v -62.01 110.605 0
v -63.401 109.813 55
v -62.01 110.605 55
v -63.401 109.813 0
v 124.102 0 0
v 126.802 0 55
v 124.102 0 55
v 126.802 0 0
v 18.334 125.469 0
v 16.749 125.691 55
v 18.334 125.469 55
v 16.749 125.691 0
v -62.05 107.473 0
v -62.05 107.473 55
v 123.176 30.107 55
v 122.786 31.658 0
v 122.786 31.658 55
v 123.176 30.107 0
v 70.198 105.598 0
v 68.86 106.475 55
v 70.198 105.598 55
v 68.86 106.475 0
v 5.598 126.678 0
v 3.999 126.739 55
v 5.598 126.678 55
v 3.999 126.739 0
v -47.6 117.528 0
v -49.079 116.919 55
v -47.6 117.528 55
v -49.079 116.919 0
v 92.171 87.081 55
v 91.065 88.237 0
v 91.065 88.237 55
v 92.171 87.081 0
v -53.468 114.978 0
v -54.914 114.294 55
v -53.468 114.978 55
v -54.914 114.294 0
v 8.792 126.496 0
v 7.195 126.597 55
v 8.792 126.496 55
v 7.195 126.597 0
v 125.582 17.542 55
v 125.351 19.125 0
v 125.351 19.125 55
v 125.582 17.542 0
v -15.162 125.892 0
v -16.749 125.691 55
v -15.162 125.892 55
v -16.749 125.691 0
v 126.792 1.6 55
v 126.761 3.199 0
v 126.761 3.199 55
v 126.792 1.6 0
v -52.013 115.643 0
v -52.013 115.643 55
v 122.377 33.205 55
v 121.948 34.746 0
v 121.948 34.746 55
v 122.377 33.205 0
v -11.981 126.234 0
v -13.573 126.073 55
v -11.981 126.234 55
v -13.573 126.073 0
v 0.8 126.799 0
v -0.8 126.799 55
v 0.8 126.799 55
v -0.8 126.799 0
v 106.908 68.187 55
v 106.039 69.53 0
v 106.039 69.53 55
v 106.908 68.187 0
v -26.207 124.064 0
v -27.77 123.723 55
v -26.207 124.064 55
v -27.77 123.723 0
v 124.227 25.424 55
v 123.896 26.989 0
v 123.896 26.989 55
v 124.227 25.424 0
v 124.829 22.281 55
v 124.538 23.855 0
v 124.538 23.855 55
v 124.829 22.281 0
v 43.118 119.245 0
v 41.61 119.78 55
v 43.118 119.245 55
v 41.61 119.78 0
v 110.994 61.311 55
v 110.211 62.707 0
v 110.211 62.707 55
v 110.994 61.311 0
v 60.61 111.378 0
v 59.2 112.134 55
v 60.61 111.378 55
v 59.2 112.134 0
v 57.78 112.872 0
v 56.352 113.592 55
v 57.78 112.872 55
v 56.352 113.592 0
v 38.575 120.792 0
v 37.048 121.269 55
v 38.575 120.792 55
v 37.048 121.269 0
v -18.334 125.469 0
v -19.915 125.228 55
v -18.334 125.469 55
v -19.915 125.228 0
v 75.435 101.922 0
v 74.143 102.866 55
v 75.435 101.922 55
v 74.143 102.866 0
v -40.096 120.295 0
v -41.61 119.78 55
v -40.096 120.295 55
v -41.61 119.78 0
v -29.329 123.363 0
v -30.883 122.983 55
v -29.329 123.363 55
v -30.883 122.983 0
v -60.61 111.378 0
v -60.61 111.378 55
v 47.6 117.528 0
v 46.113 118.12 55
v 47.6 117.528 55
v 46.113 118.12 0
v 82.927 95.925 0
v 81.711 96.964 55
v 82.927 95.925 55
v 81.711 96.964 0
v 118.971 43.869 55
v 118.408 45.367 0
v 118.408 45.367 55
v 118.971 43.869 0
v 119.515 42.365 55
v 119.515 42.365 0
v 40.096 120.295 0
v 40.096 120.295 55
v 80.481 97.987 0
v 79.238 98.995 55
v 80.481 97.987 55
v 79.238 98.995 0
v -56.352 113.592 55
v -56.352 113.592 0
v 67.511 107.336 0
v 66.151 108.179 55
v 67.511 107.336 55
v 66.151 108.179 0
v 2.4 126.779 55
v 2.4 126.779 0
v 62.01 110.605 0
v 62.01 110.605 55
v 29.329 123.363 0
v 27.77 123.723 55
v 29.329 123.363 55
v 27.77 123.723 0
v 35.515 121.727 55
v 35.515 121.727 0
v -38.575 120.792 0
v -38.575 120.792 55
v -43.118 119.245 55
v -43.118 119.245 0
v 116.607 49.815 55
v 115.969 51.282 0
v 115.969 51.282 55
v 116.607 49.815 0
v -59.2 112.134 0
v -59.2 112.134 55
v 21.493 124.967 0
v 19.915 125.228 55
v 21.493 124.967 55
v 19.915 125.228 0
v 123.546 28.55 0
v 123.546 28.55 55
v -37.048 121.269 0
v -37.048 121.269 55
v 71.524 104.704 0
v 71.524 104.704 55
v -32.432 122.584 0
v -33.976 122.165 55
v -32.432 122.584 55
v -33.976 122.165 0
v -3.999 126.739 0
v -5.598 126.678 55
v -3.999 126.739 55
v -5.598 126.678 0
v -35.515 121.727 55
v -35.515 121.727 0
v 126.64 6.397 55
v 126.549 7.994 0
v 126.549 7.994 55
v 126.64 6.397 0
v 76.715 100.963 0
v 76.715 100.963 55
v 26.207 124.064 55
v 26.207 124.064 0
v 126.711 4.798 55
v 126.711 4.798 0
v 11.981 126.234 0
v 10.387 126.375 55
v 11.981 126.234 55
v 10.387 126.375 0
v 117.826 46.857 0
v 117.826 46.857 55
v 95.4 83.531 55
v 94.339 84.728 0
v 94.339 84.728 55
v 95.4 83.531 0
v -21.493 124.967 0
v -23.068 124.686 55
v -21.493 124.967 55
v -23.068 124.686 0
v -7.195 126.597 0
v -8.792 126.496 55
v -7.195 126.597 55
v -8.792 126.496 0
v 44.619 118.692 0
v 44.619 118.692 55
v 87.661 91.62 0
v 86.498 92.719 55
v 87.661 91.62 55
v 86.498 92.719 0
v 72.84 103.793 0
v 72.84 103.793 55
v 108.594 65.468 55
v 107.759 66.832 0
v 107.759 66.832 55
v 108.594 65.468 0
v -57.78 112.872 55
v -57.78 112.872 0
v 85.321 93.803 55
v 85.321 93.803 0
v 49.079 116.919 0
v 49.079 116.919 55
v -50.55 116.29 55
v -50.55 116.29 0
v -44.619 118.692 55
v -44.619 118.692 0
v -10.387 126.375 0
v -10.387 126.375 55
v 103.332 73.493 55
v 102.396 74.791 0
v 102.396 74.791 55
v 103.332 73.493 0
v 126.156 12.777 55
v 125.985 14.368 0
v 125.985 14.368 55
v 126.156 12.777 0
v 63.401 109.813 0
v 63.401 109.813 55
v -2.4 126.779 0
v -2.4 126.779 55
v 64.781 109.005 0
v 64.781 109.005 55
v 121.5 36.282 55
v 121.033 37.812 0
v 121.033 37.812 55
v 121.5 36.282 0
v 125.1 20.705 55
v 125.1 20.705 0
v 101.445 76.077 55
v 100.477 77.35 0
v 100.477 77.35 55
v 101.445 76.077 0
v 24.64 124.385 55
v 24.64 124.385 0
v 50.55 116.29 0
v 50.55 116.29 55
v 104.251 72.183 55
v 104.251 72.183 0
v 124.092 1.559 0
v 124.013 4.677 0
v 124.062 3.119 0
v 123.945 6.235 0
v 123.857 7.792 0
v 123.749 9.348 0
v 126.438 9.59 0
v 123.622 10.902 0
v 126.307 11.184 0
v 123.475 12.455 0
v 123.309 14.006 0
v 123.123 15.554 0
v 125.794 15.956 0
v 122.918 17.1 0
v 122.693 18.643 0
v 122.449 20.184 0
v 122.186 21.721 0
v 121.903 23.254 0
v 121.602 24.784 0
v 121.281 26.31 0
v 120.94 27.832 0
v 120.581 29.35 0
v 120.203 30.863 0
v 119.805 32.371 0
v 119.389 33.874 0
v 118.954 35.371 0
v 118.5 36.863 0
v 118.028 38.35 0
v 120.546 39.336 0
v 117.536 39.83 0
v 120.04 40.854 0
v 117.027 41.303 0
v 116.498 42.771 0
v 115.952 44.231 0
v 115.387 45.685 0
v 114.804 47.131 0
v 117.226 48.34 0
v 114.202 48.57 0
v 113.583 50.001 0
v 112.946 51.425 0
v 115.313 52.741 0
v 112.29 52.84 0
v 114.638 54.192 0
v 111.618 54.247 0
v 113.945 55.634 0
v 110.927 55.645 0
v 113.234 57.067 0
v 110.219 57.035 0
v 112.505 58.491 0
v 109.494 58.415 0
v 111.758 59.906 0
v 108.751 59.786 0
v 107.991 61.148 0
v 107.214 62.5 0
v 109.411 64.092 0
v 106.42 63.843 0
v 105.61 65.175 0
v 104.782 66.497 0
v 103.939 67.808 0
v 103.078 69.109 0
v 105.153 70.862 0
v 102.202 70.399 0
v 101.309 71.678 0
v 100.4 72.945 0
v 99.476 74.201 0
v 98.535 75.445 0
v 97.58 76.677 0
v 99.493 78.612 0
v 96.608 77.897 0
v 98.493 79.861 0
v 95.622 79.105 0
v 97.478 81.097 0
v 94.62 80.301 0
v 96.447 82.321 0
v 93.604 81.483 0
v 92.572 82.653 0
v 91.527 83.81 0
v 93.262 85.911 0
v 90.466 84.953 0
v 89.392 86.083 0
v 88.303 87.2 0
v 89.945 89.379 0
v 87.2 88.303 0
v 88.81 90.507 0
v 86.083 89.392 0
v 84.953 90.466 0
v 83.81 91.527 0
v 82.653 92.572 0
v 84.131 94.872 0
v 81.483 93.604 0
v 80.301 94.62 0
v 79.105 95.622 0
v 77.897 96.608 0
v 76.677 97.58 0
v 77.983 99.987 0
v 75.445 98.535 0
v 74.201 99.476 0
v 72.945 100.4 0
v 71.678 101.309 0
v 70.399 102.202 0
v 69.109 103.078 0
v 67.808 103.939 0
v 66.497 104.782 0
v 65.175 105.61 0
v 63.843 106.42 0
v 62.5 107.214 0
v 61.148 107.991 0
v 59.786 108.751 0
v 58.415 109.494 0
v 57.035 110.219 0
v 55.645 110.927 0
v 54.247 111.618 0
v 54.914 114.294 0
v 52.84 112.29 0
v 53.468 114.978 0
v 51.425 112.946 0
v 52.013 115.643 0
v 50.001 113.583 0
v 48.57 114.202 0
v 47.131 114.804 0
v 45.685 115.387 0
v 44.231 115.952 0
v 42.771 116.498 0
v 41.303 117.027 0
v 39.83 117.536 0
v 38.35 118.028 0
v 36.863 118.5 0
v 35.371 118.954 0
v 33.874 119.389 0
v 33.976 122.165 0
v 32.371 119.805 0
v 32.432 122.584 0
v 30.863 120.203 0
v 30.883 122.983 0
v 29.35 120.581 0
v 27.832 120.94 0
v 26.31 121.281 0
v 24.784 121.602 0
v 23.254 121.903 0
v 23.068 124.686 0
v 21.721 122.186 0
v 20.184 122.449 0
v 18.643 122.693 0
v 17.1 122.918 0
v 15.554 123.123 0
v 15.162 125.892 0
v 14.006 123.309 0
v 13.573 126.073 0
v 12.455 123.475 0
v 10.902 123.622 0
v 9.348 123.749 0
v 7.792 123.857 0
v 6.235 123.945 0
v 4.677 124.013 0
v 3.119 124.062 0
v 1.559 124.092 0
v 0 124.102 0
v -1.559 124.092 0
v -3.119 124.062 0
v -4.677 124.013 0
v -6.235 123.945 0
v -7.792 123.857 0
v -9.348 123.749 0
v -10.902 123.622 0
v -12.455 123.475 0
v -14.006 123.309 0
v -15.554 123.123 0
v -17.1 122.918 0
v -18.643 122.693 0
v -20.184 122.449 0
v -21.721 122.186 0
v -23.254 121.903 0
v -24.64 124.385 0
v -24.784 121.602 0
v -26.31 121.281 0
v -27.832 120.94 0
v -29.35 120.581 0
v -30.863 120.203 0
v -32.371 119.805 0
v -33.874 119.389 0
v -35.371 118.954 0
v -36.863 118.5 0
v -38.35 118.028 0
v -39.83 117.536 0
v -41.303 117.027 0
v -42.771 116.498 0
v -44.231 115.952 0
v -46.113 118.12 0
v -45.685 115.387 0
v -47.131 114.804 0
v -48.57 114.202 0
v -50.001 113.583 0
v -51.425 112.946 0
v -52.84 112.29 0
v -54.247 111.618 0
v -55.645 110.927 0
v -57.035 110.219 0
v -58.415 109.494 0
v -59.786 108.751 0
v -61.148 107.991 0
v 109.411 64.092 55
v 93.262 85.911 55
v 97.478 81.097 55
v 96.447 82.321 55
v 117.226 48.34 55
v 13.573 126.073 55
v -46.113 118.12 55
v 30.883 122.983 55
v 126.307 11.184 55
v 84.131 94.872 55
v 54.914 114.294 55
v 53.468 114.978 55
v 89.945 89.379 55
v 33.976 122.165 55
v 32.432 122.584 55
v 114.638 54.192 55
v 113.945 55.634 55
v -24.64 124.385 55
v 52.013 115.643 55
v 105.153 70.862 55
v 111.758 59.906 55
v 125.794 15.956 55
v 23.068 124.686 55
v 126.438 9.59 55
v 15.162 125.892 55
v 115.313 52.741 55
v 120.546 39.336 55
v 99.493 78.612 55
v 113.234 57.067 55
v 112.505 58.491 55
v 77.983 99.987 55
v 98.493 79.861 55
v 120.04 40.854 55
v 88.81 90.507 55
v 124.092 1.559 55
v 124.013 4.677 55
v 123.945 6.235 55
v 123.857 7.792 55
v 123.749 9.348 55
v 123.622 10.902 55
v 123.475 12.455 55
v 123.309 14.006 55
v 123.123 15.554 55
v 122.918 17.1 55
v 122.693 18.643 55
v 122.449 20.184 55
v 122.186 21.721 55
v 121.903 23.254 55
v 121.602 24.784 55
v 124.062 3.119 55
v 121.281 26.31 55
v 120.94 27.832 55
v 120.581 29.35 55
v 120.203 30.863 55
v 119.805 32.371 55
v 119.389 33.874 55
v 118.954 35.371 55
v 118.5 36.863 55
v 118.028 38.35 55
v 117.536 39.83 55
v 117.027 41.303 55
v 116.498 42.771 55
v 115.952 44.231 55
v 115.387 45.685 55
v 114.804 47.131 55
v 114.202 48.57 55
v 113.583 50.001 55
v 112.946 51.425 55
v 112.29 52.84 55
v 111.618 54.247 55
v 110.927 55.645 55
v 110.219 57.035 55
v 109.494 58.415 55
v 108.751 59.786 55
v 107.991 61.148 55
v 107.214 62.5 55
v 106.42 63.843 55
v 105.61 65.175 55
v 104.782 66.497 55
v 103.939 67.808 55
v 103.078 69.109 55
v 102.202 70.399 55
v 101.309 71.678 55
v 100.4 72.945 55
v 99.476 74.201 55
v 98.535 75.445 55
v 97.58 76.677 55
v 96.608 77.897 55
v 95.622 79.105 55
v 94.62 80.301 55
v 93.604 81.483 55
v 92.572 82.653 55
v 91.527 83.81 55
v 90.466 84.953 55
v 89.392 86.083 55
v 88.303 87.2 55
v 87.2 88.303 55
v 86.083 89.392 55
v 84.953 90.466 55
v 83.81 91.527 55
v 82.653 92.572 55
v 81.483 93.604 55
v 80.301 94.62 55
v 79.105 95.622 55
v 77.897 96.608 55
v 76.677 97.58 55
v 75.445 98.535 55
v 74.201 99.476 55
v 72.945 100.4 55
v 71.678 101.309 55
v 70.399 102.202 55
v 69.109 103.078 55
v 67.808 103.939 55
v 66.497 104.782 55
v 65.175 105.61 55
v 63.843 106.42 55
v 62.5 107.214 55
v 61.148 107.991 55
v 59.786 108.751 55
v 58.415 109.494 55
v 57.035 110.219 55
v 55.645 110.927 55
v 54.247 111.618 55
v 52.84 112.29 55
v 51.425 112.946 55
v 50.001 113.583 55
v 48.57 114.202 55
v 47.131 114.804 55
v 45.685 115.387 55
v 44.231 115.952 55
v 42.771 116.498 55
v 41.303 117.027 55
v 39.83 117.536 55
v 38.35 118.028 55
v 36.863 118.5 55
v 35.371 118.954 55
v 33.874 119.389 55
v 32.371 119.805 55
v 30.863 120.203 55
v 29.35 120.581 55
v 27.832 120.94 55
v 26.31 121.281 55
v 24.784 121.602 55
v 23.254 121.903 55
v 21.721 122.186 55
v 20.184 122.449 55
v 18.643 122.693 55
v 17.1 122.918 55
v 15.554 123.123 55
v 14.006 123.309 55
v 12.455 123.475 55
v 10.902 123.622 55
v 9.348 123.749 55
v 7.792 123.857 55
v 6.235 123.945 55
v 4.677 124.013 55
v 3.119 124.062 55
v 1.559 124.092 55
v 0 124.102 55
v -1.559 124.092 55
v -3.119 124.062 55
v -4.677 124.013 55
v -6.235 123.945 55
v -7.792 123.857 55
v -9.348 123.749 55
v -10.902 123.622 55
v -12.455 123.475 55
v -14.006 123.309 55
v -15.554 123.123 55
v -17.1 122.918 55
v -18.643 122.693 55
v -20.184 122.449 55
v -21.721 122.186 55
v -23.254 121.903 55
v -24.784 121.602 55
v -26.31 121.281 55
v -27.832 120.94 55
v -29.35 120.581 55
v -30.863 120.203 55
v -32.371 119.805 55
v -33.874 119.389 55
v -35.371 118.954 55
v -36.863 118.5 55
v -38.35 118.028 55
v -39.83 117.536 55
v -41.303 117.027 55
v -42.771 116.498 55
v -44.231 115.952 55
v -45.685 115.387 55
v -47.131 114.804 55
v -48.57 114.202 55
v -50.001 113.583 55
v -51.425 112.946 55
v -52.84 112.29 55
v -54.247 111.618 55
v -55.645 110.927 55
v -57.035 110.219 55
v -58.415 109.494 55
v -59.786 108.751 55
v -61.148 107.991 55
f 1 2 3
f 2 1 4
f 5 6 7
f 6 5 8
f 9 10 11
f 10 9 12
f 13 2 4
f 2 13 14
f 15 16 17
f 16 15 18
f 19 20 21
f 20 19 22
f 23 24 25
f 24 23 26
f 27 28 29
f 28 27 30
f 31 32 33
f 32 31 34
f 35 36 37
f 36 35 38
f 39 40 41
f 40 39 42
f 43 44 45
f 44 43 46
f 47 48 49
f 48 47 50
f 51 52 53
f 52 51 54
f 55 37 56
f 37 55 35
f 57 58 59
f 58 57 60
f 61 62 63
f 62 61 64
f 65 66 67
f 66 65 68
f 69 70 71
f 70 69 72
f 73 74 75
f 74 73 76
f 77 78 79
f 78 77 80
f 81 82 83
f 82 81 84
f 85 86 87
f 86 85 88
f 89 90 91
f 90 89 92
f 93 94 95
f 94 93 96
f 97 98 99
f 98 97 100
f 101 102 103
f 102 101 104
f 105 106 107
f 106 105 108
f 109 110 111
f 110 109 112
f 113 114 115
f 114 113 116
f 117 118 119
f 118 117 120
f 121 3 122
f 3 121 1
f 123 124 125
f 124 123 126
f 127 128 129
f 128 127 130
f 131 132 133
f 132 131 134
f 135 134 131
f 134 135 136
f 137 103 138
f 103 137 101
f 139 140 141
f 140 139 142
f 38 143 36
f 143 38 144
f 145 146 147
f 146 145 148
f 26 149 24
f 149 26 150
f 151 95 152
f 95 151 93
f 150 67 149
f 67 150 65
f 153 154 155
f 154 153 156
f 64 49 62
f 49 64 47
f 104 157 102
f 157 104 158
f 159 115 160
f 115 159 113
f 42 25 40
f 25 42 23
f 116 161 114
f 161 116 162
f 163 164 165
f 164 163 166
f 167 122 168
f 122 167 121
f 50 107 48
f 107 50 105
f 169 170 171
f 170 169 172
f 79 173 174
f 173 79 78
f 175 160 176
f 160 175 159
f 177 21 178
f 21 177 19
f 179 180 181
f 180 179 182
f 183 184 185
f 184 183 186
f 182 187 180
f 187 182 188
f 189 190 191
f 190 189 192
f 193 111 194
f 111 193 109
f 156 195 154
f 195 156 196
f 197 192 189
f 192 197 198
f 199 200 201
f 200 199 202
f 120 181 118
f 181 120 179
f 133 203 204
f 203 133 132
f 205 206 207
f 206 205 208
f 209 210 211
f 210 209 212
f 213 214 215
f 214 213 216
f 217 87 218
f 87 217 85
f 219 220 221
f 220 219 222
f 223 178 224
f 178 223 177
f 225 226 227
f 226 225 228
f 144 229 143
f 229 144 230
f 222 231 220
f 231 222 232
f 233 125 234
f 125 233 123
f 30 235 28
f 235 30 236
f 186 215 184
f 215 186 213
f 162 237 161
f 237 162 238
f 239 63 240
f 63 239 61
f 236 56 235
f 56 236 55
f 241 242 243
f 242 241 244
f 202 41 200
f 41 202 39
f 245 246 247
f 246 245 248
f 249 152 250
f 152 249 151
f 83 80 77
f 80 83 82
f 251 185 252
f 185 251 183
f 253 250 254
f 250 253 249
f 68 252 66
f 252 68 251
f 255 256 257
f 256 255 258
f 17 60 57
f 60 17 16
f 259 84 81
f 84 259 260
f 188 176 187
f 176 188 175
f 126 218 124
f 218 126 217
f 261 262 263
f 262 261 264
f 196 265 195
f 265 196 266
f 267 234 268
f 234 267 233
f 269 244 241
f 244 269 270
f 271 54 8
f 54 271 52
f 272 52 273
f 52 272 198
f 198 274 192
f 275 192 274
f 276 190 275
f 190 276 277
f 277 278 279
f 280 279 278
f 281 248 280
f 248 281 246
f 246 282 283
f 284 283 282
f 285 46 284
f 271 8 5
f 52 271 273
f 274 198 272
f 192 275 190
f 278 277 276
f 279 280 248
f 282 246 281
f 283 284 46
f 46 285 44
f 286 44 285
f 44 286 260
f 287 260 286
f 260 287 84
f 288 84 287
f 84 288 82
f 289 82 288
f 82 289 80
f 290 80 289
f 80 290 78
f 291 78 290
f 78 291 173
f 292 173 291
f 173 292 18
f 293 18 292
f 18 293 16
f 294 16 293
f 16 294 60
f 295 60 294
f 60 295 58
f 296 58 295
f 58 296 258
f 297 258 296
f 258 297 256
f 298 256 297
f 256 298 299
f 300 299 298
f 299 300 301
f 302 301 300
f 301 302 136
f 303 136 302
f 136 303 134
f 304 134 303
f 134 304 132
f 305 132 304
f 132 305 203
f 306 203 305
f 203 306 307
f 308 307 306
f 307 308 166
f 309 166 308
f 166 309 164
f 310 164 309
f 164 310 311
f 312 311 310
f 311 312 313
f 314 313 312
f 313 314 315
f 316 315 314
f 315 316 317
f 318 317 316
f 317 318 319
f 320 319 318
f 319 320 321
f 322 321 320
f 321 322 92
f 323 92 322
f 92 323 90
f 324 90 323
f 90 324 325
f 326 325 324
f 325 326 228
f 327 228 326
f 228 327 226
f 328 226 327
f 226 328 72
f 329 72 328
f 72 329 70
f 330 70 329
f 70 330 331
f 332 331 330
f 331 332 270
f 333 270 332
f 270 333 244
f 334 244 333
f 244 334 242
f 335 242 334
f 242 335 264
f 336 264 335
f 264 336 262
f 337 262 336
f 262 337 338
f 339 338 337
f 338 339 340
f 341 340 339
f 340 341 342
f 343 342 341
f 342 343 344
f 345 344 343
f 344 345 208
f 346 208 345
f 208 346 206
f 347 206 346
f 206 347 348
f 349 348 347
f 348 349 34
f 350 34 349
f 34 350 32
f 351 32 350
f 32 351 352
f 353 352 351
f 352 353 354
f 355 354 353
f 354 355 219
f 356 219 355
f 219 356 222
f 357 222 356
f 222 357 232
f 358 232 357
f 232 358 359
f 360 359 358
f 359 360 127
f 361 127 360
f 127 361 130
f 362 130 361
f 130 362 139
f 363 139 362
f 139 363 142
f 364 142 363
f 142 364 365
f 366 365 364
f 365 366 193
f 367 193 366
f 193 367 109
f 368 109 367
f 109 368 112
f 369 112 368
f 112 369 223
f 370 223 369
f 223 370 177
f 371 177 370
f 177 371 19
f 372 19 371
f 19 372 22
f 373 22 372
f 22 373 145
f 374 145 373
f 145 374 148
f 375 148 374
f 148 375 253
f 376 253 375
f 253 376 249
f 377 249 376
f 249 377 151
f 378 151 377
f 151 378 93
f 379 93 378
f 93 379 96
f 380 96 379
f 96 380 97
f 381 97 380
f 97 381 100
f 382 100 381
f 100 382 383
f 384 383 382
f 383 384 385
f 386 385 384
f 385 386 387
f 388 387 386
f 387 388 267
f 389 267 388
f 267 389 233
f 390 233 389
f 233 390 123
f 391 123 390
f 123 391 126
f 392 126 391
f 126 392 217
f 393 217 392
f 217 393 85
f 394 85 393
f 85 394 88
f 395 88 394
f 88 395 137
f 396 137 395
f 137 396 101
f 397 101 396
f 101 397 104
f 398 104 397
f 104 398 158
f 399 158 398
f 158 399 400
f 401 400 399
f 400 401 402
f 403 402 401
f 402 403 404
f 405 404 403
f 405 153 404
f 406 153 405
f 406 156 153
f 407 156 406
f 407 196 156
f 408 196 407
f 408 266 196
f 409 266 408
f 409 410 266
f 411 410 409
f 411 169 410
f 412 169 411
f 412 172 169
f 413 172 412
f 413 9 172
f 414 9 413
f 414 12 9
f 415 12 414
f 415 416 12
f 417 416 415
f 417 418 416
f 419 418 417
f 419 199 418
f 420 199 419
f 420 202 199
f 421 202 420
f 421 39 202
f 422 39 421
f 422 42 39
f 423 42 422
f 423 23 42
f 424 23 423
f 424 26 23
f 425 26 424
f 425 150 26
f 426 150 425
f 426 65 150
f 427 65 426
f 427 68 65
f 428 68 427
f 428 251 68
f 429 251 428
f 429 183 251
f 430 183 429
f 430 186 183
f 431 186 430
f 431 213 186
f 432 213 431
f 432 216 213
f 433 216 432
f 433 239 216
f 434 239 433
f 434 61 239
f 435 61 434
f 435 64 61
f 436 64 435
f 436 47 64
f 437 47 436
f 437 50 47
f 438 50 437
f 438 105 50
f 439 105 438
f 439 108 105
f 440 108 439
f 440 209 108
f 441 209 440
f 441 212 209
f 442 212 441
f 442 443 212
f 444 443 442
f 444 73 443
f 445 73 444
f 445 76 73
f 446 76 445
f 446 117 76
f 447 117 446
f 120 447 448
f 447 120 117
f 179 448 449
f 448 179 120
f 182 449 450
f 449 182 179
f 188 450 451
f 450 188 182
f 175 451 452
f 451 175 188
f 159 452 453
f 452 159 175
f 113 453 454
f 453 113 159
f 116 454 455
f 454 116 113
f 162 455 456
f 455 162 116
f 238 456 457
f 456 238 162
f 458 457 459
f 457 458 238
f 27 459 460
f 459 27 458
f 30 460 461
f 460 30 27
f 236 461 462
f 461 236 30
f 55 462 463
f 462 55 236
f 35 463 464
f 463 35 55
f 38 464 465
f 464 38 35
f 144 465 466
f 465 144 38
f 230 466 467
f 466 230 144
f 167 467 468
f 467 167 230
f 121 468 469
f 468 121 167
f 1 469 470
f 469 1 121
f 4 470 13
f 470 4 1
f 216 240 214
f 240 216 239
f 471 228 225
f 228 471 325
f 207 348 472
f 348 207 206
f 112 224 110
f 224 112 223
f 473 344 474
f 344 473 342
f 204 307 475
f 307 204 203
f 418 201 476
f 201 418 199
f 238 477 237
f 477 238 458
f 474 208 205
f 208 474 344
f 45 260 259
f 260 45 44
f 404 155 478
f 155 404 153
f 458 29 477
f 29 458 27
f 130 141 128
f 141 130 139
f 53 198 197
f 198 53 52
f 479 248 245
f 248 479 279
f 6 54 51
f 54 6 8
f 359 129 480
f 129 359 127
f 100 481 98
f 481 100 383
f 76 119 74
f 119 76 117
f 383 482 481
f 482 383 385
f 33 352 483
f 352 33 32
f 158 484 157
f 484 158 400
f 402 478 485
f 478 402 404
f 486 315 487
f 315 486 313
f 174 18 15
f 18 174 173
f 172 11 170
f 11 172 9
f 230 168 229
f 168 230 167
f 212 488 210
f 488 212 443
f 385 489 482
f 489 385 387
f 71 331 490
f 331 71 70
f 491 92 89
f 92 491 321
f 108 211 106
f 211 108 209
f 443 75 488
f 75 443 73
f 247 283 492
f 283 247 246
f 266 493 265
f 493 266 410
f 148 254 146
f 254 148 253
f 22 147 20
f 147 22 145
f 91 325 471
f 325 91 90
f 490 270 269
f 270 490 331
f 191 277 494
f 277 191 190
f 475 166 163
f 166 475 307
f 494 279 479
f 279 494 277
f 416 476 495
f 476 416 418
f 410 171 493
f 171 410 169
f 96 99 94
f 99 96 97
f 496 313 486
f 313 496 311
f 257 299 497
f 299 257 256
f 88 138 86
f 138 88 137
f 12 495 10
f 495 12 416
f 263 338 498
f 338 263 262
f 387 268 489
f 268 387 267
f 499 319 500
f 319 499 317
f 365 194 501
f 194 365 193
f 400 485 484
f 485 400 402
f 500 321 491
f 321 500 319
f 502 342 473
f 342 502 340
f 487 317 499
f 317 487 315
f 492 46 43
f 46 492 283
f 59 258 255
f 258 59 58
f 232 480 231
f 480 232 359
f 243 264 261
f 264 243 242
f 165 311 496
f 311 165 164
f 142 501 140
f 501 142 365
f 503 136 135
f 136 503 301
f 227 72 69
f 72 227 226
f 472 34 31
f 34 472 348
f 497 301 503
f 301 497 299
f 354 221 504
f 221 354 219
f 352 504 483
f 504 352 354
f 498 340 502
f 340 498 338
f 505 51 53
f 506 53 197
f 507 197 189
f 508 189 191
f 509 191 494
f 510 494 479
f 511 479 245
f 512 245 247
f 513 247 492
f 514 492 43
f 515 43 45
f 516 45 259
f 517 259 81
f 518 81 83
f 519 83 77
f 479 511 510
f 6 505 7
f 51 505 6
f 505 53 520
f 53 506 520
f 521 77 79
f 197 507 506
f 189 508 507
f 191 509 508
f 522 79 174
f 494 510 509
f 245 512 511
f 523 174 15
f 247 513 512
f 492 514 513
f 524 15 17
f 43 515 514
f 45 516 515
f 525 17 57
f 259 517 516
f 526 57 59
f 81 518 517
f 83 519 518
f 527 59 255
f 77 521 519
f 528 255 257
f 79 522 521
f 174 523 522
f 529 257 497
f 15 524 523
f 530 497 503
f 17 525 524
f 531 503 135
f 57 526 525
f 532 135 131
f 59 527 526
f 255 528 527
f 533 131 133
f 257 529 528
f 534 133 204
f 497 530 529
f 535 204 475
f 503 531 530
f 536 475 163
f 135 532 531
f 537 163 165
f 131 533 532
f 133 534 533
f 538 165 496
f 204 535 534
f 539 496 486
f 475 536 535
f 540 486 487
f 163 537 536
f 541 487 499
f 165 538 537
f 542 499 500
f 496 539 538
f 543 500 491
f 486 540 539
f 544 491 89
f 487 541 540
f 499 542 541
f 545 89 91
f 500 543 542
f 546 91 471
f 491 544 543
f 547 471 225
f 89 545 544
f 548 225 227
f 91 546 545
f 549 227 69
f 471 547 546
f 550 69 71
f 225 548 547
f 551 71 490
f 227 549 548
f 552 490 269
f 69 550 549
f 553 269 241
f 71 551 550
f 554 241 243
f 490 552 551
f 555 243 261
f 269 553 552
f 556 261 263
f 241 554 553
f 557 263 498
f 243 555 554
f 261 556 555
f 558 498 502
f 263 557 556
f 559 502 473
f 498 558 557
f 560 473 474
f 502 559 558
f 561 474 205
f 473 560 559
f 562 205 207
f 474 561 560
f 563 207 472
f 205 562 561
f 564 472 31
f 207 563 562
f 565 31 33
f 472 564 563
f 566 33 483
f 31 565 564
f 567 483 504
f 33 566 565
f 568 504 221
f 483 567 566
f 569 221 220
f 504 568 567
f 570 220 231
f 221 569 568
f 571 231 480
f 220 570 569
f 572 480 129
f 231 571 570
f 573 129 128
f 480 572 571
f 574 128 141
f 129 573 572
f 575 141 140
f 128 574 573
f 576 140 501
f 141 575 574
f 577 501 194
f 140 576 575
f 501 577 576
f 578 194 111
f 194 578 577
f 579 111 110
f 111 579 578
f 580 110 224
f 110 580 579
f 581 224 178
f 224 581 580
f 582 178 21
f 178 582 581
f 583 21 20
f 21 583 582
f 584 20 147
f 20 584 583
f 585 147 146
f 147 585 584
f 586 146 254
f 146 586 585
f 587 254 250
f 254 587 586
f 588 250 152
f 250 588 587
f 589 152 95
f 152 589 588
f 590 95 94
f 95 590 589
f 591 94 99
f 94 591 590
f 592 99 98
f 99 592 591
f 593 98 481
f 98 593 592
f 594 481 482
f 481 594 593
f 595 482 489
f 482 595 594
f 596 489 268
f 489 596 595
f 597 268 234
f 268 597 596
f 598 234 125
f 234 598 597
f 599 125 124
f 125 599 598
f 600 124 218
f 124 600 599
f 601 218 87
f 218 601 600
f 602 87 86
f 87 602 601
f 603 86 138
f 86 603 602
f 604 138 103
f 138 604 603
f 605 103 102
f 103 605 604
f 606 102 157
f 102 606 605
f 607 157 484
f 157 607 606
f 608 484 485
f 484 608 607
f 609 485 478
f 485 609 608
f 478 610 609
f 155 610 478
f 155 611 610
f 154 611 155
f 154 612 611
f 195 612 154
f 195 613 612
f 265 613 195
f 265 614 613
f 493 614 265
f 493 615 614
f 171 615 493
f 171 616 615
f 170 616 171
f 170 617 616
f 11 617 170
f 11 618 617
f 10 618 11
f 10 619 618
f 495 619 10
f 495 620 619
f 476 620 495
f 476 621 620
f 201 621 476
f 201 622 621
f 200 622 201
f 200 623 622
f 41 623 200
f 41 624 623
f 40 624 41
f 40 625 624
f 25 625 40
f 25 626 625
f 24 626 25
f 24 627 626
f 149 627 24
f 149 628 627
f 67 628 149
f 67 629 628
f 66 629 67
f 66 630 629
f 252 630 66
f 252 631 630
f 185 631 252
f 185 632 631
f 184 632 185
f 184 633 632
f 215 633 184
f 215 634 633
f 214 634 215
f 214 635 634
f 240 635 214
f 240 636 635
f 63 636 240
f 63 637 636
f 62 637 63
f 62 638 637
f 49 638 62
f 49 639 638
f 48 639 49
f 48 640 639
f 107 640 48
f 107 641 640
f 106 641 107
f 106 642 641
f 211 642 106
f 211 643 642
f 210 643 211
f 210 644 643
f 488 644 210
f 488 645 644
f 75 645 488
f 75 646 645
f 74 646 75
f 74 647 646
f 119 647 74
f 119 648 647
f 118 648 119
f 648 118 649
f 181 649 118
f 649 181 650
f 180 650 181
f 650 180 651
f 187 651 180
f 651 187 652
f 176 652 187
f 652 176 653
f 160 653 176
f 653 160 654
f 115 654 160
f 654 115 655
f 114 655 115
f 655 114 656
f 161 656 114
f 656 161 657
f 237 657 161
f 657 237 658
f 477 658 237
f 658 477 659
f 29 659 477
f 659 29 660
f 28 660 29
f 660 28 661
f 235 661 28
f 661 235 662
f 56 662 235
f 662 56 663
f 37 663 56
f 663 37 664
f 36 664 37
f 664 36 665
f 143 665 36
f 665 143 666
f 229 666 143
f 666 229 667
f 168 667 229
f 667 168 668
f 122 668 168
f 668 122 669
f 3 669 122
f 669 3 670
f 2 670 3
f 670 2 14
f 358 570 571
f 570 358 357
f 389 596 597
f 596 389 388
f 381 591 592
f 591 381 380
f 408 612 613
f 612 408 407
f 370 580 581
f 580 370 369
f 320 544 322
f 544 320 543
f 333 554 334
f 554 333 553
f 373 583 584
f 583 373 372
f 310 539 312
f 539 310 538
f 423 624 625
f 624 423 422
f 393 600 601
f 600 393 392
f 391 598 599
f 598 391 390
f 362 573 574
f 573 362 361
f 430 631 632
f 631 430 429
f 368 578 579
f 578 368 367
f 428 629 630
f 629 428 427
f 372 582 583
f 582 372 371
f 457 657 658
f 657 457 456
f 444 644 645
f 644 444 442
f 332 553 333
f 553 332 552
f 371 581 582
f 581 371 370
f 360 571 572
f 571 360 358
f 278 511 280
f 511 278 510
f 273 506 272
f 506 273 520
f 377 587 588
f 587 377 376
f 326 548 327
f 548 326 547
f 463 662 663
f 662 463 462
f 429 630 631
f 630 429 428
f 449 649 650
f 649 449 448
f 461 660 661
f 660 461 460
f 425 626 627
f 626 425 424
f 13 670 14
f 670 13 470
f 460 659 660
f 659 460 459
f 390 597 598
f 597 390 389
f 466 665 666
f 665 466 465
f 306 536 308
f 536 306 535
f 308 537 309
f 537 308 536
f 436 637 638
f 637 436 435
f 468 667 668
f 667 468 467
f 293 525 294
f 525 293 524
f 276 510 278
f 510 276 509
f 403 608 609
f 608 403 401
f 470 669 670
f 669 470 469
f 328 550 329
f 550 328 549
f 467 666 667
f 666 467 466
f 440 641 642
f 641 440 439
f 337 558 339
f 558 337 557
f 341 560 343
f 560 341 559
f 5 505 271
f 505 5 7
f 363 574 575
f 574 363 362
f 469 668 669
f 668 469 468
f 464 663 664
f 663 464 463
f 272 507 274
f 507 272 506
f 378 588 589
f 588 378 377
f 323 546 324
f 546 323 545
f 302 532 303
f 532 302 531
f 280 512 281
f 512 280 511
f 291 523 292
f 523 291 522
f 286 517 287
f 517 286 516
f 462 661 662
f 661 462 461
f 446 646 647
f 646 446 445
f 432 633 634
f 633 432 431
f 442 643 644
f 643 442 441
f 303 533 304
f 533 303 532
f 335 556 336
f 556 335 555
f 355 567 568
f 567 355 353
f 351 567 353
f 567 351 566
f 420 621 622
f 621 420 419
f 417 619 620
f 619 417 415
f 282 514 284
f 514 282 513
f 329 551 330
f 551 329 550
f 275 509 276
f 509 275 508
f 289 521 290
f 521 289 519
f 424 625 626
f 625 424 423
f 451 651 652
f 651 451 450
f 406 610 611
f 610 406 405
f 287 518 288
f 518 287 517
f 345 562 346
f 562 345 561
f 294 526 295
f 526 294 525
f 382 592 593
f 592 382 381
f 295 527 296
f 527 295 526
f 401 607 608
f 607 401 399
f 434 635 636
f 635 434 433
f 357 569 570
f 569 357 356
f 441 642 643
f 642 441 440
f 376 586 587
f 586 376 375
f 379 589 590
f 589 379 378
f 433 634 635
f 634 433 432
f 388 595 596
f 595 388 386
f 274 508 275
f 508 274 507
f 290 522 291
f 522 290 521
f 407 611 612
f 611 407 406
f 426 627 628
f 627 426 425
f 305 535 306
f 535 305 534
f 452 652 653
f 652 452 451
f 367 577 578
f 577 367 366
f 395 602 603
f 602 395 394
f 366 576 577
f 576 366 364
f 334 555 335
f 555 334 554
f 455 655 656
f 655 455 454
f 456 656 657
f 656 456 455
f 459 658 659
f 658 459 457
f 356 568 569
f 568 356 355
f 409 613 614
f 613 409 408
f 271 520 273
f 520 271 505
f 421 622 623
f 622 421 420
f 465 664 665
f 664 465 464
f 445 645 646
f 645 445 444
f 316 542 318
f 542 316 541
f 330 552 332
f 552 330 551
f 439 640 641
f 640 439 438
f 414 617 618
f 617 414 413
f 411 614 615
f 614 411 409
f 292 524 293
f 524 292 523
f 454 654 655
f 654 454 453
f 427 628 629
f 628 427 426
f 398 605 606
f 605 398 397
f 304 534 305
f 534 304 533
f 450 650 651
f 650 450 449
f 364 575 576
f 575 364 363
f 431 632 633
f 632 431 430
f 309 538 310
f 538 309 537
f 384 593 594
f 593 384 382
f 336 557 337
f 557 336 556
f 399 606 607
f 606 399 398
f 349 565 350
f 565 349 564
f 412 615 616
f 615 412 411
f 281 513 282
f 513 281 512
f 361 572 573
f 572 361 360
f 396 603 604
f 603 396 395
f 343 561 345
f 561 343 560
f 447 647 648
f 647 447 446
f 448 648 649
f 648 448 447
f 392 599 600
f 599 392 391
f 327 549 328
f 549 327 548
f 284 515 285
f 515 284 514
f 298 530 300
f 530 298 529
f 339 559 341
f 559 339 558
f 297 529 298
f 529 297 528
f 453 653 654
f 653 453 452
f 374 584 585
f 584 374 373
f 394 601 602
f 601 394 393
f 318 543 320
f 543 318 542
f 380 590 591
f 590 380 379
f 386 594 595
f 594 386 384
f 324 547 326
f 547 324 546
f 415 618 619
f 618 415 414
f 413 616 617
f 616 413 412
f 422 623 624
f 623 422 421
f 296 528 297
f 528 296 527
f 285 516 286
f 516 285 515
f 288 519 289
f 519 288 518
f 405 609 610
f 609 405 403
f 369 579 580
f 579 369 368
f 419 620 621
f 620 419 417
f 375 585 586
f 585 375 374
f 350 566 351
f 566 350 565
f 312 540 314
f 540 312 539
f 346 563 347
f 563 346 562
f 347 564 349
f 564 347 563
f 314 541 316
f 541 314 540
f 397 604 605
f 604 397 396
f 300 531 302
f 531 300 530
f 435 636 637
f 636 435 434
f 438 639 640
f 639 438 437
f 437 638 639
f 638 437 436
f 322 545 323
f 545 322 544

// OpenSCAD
module pieSlice(a, r, h){
  // a:angle, r:radius, h:height
  rotate_extrude(angle=a, $fn=500) square([r,h]);
}

// Note: no idea why there's a .008 here. It is equal to .2mm though - maybe it's a tolerance?
outer_rad = 10.008*25.4/2;	// 10 inch
// outer_rad = 12.008*25.4/2; 		// 12 inch

// thickness appears to be 3, so im doing 2.7
tol = 0.3;
tol_tight = 0.1;
tol_loose = 0.2;

// h = 32; // from the original drum prototype
h = 55;

rotate([0, 0, -30])
shell();

/*
rotate([0, 0, -30]) {
difference() {
	shell();
	jack(true, 1.8);
}
difference() {
	jack(true, 1.8);
	jack(false, 1.8);
}
}
//*/

module shell() {
	// from https://www.instructables.com/E-drum-With-Small-3D-Printer-and-Thick-Paper/
	rotate([0, 0, 30])
	difference() {
		pieSlice(120,outer_rad-tol,h);
		pieSlice(360, outer_rad-tol-2.7,h);
	}
}

module jack(cutout, offset) {
	// the top of the drum shell (that is not covered by the sides of the mesh head
	// is about 15mm from the top
	// the visible bottom is about 3mm from the bottom
	jack_height = ((h-15) + 3)/2;  // TODO: figure out
	jack_r = 9.6/2;
	hole_r = jack_r + tol_loose;
	cube_h = 3;
	cutout_h = jack_r*4.5;
	
	translate([0, outer_rad, jack_height])
	rotate([90, 0, 0]) {
		if (cutout)
			translate([0, 0, offset]) cube([cutout_h, cutout_h, cube_h], center=true);
		else
			cylinder(100, hole_r, hole_r, $fn=50);
	}
}
